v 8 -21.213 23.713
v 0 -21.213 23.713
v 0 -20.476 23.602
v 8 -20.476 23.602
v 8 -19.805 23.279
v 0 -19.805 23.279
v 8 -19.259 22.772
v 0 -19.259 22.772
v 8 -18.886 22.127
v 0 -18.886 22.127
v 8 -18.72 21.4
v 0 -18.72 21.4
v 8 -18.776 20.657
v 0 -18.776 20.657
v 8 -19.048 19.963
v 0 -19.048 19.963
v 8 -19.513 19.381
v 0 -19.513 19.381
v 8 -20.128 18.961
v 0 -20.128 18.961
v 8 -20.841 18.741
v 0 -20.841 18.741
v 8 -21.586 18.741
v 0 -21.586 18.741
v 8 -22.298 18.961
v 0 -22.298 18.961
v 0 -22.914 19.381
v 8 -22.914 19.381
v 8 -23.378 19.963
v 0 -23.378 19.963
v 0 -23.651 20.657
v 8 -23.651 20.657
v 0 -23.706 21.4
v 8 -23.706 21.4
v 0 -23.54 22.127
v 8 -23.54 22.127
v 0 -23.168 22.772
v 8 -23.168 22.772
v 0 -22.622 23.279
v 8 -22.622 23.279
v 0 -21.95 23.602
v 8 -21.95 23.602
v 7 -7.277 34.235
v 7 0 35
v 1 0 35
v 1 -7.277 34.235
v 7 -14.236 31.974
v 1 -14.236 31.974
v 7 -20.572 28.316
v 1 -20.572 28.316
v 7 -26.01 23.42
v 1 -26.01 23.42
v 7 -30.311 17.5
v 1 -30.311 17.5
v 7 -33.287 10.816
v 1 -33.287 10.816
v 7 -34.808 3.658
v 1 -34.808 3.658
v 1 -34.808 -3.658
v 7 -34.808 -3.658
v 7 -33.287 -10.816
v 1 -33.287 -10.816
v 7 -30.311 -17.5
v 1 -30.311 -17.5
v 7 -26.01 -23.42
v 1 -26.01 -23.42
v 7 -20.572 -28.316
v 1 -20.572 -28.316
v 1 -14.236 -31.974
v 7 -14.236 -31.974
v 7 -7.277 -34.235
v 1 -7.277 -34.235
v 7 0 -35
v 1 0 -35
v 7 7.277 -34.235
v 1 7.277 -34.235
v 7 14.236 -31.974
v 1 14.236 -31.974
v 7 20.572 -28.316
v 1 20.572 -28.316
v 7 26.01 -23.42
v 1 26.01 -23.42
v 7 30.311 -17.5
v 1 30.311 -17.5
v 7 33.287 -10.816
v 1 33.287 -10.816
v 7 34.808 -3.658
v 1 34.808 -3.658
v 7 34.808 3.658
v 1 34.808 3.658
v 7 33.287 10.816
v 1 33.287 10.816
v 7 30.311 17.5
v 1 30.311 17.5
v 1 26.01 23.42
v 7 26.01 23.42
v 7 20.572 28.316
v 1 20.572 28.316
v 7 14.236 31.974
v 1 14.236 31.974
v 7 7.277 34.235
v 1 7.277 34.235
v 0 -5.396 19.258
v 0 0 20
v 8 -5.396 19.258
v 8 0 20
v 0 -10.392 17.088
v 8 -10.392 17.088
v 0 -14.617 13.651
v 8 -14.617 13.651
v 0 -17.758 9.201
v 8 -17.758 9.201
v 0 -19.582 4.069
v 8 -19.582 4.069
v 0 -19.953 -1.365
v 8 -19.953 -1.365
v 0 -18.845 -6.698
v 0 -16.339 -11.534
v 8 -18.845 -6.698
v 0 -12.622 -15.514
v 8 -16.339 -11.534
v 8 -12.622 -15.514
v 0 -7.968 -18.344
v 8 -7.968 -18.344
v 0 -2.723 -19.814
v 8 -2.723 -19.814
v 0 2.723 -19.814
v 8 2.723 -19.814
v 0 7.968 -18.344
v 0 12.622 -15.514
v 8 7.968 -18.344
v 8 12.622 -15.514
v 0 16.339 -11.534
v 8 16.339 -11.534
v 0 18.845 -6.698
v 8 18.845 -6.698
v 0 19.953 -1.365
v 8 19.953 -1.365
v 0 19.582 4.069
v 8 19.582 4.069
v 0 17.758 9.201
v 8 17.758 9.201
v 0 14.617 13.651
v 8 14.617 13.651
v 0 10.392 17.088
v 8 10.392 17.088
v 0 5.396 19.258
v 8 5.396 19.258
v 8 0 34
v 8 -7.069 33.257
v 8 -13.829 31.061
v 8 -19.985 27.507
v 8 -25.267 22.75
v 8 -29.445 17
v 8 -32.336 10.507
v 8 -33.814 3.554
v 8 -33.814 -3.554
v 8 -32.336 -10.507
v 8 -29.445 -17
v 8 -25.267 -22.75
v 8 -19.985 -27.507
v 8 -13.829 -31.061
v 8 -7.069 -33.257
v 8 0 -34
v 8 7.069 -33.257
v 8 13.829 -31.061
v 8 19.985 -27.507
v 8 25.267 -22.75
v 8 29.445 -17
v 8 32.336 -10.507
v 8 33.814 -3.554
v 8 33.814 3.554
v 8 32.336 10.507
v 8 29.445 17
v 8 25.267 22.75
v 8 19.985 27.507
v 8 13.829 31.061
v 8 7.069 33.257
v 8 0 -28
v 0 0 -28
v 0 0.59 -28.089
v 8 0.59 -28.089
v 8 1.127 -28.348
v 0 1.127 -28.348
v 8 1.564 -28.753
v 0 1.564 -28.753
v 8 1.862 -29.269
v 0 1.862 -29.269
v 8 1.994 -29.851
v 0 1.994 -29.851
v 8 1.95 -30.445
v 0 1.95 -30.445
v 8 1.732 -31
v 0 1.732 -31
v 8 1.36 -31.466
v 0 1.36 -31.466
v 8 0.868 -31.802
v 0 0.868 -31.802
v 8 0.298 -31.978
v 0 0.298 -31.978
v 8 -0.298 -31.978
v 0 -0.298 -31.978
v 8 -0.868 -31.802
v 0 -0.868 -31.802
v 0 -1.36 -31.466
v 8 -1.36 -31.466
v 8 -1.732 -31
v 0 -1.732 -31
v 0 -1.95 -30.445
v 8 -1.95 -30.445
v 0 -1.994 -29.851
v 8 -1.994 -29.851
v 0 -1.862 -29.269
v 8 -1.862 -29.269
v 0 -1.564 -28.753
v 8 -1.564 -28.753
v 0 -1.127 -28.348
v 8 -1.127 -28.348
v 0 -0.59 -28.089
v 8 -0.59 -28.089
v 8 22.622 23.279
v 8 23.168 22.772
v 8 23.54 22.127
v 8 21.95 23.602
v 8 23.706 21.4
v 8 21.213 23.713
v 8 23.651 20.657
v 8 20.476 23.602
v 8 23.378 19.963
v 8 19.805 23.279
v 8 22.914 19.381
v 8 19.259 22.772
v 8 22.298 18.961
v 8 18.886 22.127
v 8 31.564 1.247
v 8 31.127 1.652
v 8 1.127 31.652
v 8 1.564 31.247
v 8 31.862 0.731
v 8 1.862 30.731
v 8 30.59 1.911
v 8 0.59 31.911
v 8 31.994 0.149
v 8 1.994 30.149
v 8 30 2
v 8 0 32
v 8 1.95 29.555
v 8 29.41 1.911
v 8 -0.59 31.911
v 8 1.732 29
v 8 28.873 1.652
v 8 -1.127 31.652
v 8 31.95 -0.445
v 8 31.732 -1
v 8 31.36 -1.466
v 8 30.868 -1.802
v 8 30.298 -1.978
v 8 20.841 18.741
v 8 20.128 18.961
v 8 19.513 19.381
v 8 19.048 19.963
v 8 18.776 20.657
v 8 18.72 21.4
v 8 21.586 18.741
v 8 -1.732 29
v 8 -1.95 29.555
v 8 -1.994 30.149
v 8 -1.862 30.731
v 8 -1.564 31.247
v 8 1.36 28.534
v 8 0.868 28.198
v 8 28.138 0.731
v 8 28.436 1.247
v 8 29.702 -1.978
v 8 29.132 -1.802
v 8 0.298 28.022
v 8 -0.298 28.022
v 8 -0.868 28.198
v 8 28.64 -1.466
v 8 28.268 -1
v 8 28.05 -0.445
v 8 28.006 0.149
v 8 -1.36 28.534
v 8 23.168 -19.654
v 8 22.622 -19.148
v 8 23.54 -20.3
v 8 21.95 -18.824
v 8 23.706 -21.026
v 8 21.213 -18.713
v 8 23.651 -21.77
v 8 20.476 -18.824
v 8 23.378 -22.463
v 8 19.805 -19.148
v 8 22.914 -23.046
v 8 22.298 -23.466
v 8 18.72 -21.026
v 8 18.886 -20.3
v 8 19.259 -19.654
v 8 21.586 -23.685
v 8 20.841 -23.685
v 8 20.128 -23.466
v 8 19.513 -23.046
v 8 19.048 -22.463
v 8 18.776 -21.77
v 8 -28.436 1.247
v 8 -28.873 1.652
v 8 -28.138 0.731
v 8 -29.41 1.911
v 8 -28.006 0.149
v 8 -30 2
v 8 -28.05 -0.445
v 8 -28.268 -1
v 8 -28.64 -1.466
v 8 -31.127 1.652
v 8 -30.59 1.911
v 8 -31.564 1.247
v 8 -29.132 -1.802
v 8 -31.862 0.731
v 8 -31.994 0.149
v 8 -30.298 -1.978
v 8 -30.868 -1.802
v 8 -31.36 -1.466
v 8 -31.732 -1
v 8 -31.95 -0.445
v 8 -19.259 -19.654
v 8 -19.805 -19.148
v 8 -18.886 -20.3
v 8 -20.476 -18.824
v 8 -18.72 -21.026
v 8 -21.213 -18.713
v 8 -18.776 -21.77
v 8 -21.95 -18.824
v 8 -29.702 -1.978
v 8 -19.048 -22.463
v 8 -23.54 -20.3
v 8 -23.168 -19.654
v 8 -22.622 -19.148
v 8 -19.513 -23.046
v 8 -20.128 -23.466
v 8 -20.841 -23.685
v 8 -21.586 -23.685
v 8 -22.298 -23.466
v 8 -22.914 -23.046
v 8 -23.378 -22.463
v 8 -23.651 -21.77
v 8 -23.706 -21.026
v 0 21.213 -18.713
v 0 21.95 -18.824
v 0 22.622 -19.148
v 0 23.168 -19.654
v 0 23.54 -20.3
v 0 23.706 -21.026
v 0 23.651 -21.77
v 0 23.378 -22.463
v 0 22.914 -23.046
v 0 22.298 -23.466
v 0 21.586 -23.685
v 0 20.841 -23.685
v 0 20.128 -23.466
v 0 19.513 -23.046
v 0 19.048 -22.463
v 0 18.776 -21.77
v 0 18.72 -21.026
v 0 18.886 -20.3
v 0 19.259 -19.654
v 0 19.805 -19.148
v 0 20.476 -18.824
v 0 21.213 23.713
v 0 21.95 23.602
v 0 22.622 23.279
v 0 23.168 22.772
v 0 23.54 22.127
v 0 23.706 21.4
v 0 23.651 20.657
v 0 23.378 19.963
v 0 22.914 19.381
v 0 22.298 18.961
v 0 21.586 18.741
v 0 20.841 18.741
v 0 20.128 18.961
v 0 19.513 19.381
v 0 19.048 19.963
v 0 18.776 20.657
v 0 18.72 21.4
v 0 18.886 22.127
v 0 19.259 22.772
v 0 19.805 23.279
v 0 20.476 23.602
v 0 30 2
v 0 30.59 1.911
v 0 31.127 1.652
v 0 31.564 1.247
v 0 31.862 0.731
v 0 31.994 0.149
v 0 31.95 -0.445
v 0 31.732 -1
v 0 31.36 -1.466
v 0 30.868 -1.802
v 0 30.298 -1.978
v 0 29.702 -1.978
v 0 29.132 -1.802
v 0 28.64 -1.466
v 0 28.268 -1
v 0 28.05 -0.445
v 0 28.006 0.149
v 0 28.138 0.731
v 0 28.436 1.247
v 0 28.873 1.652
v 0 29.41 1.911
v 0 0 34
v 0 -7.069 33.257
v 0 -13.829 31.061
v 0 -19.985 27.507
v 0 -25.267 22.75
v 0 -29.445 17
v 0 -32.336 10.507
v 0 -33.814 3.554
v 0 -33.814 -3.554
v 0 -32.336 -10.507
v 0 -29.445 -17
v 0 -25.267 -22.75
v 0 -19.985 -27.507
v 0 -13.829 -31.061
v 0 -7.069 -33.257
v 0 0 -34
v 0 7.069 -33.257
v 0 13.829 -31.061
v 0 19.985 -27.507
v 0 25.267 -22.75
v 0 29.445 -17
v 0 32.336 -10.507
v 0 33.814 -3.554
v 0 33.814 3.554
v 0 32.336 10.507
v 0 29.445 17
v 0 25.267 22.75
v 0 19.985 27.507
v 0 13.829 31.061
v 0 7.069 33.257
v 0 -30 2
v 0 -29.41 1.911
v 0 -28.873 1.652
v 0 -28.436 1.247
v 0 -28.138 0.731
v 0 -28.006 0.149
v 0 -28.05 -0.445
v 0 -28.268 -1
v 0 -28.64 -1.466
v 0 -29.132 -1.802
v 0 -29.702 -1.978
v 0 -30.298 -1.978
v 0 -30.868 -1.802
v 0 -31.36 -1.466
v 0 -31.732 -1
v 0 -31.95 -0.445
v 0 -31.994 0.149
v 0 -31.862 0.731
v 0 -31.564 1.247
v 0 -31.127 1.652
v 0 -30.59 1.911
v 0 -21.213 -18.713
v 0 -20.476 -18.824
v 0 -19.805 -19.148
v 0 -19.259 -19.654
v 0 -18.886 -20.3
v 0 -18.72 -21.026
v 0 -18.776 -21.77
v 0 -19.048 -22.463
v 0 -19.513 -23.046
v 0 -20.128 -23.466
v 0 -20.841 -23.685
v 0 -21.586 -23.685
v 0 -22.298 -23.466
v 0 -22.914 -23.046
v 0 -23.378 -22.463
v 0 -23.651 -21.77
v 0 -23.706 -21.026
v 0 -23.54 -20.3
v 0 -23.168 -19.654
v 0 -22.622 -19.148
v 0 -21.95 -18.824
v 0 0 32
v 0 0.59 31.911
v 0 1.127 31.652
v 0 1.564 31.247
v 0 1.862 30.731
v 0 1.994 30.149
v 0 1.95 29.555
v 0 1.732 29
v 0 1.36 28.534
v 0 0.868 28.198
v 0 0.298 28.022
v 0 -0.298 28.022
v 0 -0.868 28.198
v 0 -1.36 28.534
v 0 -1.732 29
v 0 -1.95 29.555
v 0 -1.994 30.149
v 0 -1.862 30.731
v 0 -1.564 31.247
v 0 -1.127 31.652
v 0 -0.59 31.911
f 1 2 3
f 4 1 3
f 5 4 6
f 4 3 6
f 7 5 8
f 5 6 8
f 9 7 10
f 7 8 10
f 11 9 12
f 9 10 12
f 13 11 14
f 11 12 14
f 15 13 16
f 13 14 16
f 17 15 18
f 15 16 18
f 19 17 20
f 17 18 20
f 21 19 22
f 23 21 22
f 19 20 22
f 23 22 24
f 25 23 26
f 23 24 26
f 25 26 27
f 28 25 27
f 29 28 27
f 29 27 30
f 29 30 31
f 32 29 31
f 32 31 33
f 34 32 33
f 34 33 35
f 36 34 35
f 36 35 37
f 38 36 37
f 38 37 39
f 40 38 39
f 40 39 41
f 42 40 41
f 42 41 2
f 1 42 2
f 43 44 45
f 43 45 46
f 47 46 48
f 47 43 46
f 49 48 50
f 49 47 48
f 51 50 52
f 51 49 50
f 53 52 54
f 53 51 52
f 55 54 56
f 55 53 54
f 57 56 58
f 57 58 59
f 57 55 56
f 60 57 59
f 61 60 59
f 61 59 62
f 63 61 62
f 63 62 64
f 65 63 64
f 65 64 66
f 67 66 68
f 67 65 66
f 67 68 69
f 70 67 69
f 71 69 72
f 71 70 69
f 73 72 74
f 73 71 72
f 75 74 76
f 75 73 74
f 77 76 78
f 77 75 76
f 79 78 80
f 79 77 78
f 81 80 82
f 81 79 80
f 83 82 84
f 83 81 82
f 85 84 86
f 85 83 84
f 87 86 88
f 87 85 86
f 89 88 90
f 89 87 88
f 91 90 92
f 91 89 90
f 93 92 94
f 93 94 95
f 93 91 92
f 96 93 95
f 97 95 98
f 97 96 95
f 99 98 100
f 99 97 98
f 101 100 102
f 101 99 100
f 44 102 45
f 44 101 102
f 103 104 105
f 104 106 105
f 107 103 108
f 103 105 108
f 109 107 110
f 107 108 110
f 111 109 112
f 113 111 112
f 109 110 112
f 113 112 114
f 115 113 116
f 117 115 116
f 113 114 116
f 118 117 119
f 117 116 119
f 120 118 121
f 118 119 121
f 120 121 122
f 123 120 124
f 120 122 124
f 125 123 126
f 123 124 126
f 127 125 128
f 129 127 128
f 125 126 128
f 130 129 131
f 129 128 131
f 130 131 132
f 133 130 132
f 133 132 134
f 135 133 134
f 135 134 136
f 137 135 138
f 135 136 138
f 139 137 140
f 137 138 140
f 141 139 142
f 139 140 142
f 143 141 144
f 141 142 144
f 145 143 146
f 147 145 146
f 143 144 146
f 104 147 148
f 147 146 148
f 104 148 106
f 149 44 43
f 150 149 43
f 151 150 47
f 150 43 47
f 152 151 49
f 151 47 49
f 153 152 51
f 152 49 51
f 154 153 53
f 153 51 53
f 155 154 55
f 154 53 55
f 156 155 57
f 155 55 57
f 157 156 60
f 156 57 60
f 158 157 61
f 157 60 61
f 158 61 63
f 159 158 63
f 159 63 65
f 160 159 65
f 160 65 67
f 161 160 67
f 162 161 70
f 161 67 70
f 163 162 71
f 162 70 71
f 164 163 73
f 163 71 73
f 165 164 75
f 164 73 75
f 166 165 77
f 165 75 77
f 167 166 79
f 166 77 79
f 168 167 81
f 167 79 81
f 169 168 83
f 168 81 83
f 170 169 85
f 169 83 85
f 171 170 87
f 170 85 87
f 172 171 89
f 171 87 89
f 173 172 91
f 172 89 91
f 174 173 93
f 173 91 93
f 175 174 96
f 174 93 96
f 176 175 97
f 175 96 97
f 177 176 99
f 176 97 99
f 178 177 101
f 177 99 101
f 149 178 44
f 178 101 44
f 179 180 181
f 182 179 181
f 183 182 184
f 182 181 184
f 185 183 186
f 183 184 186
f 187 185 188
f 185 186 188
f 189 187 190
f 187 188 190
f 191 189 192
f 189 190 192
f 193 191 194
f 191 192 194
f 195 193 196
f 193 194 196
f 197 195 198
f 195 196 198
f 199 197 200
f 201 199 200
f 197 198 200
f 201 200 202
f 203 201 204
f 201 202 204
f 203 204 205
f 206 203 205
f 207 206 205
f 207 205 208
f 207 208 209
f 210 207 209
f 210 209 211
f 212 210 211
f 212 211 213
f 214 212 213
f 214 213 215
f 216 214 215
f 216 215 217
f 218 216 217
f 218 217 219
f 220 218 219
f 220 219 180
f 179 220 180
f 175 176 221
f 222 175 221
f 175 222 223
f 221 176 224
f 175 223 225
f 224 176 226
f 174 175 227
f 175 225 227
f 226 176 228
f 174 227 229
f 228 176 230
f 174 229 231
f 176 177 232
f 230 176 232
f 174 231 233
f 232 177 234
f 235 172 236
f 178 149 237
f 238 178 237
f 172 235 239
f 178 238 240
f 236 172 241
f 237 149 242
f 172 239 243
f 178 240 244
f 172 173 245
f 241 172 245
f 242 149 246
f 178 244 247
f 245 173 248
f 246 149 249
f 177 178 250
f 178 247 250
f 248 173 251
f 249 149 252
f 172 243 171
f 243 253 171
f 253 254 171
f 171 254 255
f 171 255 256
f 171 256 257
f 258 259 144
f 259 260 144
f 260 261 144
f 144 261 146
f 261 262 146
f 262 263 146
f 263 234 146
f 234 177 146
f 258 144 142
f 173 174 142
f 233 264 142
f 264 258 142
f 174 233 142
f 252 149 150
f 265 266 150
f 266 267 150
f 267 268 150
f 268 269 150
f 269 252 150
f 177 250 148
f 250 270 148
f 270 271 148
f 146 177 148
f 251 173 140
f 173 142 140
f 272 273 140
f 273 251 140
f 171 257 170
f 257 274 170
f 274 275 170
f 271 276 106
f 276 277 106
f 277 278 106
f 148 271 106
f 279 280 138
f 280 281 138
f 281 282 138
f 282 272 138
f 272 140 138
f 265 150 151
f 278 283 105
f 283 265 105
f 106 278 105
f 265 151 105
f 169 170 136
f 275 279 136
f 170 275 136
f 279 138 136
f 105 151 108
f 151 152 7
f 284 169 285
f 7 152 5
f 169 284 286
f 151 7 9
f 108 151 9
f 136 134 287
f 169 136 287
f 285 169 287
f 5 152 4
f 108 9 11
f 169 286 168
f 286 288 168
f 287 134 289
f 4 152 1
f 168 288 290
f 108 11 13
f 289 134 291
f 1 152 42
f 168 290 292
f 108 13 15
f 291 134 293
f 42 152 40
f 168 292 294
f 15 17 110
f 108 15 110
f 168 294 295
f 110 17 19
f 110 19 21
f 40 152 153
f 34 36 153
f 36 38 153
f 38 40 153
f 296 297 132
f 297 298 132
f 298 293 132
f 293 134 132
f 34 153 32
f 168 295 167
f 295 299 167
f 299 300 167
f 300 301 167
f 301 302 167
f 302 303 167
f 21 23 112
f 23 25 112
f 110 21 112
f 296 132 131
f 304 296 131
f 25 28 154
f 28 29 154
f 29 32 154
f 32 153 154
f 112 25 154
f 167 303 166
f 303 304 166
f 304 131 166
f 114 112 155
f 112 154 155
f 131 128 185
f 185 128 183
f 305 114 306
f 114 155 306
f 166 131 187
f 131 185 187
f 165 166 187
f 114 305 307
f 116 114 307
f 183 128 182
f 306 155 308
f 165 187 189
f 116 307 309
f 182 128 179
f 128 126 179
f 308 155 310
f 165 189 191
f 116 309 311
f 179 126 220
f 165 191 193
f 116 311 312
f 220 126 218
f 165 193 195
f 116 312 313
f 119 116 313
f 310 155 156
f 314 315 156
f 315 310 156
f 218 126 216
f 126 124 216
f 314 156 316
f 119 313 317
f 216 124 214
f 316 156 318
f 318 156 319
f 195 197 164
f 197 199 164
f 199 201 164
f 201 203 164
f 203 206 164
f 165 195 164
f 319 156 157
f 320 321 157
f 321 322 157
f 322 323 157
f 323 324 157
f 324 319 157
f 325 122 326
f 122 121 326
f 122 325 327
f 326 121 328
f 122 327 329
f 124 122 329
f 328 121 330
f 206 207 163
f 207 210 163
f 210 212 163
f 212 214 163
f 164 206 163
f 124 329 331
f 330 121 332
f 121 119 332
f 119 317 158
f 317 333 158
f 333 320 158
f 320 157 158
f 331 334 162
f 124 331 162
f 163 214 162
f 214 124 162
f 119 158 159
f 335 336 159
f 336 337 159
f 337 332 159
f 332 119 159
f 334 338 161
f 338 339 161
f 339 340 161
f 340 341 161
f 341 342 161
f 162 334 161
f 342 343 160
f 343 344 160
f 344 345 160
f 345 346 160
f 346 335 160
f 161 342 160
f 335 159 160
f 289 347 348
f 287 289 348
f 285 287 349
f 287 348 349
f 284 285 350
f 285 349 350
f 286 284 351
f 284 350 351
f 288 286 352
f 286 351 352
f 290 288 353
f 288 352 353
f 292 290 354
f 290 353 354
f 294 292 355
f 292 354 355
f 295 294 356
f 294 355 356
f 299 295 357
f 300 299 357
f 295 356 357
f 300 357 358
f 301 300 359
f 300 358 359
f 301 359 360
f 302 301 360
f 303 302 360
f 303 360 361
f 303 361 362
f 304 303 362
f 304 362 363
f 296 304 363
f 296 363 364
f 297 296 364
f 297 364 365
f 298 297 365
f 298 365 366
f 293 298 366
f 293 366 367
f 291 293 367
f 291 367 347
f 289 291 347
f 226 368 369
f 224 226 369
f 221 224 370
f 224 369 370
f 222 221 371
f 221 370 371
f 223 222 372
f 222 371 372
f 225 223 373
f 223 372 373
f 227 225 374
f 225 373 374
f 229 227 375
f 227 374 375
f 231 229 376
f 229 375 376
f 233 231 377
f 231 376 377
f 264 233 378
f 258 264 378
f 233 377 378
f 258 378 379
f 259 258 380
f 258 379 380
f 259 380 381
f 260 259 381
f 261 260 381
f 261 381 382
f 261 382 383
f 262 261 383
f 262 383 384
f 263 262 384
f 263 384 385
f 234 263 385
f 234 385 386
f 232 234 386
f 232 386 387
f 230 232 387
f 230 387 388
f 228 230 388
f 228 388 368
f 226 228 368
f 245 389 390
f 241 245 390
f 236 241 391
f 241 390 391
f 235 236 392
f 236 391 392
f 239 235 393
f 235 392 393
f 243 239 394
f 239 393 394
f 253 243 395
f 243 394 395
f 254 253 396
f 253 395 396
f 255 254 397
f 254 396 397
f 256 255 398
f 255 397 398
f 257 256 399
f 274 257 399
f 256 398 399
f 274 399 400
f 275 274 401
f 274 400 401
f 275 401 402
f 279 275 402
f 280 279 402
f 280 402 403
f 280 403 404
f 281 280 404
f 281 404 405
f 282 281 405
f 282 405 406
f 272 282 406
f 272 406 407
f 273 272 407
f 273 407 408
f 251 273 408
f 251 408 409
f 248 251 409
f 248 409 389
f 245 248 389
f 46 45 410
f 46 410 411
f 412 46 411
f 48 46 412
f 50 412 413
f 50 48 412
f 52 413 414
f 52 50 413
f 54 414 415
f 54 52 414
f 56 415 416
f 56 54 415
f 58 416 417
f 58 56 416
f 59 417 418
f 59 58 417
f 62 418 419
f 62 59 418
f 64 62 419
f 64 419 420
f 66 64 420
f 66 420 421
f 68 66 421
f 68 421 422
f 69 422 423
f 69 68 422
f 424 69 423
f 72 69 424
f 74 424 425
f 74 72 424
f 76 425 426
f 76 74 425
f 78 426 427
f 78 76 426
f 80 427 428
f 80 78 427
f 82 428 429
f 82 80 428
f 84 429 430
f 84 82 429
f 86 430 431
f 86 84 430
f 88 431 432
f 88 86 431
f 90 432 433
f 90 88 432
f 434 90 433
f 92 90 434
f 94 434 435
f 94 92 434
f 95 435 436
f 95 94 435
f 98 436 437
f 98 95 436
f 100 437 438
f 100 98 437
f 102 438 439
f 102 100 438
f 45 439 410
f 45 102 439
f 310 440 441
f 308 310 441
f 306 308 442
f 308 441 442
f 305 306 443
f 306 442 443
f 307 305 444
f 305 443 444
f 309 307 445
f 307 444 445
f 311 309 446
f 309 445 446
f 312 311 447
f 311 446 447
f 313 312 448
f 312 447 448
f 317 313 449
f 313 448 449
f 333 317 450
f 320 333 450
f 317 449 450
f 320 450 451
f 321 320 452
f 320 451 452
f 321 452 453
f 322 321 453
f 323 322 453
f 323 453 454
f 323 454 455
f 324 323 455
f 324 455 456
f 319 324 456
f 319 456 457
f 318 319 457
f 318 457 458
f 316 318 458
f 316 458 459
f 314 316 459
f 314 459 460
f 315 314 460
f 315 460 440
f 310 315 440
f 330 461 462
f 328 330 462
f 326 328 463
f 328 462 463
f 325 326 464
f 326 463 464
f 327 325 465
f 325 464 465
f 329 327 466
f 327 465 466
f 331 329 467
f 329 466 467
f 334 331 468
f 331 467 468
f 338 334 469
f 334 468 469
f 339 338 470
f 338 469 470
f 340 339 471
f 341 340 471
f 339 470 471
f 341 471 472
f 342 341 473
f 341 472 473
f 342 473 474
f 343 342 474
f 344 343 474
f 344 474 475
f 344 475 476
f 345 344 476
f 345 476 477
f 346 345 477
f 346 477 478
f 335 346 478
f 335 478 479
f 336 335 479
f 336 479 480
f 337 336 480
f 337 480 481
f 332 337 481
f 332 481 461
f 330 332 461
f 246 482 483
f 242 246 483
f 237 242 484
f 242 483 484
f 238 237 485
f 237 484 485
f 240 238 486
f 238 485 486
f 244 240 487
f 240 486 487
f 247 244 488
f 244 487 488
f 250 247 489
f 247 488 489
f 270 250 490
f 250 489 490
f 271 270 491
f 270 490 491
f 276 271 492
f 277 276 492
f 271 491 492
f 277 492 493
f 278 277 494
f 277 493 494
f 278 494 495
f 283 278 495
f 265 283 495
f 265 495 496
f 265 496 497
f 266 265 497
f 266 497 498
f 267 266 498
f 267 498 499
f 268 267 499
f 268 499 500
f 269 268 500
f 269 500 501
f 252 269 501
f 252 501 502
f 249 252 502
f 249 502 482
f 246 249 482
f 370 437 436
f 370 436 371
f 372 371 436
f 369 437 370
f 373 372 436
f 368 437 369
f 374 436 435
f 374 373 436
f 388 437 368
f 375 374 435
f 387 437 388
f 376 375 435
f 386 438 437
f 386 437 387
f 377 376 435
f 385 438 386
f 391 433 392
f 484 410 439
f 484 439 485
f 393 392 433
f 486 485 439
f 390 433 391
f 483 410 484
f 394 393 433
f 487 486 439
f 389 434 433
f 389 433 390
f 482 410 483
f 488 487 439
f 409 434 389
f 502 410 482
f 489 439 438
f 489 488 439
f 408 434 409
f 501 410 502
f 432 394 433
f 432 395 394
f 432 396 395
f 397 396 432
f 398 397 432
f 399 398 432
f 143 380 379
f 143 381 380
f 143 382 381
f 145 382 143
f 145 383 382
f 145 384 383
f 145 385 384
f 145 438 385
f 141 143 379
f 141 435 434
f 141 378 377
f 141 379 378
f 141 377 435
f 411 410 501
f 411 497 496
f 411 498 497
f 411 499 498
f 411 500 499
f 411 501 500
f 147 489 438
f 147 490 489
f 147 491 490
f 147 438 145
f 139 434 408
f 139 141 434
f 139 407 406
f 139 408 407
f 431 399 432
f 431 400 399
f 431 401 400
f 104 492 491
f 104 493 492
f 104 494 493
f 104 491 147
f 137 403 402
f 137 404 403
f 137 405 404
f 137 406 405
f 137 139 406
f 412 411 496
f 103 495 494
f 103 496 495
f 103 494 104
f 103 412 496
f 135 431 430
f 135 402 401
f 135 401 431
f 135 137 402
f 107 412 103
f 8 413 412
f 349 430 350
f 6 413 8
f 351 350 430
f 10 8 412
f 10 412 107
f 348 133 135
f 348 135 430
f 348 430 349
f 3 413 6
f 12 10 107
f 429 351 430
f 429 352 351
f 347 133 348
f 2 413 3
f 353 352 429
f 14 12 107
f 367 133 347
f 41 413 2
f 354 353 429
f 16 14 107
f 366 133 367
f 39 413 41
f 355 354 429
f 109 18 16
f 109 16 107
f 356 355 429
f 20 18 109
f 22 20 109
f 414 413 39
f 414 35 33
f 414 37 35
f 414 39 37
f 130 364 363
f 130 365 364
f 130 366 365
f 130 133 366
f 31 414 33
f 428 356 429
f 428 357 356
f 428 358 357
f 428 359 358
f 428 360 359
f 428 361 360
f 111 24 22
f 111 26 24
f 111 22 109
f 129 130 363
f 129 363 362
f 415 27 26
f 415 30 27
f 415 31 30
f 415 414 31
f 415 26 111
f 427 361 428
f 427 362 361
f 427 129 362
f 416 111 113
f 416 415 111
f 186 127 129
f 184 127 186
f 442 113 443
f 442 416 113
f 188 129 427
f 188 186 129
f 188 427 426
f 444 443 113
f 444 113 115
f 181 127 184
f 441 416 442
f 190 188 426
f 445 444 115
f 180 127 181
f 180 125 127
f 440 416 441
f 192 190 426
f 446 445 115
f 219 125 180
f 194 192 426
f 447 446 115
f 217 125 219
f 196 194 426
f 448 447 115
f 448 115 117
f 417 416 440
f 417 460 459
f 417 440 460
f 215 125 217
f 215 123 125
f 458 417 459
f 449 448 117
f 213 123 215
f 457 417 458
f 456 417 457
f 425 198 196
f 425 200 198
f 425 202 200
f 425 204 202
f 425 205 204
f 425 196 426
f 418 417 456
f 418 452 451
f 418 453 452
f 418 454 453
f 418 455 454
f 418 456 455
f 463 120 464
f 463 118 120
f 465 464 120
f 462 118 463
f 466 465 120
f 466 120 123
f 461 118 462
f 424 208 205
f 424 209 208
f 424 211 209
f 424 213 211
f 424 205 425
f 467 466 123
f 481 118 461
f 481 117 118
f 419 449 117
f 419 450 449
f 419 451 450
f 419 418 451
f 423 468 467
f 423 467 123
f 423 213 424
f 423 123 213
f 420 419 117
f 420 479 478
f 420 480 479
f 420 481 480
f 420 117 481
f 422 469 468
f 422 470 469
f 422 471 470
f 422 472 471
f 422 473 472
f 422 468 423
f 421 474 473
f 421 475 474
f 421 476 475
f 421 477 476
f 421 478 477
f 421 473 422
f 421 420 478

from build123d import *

# Parameters (mm, degrees)
ESQUISSE1_W             = 8
ESQUISSE1_H             = 15
CHANFREIN1_SIZE         = 1
ESQUISSE3_R             = 2
ESQUISSE3_R_2           = 2.5
ENL_V_MAT_EXTRU_2_DEPTH = 51.139804547


with BuildPart() as part:
    # Esquisse1 → Base-Révolution (revolve)
    with BuildSketch(Plane.XY, mode=Mode.PRIVATE) as base_r_volution_sk:
        with Locations((4, 27.5)):
            Rectangle(ESQUISSE1_W, ESQUISSE1_H)
    revolve(base_r_volution_sk.sketch.rotate(Axis((0, 0, 0), (1, 0, 0)), 90), axis=Axis((0, 0, 0), (1, 0, 0)))

    # Chanfrein1
    chanfrein1_edges = [part.edges().sort_by_distance(p)[0] for p in [
        (0, 0, -35),
        (8, 0, -35),
    ]]
    chamfer(chanfrein1_edges, length=CHANFREIN1_SIZE)

    # Esquisse3 → Enlèv. mat.-Extru.2 (cut, through all)
    with BuildSketch(Plane.ZY):
        with Locations((0, 30)):
            Circle(ESQUISSE3_R)
        with Locations((21.213203436, 21.213203436)):
            Circle(ESQUISSE3_R_2)
        with Locations((30, 0)):
            Circle(ESQUISSE3_R)
        with Locations((21.213203436, -21.213203436)):
            Circle(ESQUISSE3_R_2)
        with Locations((0, -30)):
            Circle(ESQUISSE3_R)
        with Locations((-21.213203436, -21.213203436)):
            Circle(ESQUISSE3_R_2)
        with Locations((-30, 0)):
            Circle(ESQUISSE3_R)
        with Locations((-21.213203436, 21.213203436)):
            Circle(ESQUISSE3_R_2)
    extrude(amount=-ENL_V_MAT_EXTRU_2_DEPTH, mode=Mode.SUBTRACT)


solid = part.part
